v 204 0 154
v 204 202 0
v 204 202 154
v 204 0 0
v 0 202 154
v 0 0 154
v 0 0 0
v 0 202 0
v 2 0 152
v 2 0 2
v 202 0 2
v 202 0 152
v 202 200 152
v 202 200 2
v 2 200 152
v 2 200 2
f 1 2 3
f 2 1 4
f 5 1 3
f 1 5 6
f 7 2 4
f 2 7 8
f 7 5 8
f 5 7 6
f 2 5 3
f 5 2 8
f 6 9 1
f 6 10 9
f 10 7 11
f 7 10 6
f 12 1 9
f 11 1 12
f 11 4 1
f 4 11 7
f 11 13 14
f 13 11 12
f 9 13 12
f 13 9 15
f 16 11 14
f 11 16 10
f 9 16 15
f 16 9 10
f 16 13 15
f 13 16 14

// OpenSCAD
thickness = 2;
width = 200;
height = 150;

difference() {
	cube([thickness * 2 + width, thickness + width, thickness * 2 + height]);
	translate([thickness, -1, thickness]) {
		cube([width, width + 1, height]);
	}
}
